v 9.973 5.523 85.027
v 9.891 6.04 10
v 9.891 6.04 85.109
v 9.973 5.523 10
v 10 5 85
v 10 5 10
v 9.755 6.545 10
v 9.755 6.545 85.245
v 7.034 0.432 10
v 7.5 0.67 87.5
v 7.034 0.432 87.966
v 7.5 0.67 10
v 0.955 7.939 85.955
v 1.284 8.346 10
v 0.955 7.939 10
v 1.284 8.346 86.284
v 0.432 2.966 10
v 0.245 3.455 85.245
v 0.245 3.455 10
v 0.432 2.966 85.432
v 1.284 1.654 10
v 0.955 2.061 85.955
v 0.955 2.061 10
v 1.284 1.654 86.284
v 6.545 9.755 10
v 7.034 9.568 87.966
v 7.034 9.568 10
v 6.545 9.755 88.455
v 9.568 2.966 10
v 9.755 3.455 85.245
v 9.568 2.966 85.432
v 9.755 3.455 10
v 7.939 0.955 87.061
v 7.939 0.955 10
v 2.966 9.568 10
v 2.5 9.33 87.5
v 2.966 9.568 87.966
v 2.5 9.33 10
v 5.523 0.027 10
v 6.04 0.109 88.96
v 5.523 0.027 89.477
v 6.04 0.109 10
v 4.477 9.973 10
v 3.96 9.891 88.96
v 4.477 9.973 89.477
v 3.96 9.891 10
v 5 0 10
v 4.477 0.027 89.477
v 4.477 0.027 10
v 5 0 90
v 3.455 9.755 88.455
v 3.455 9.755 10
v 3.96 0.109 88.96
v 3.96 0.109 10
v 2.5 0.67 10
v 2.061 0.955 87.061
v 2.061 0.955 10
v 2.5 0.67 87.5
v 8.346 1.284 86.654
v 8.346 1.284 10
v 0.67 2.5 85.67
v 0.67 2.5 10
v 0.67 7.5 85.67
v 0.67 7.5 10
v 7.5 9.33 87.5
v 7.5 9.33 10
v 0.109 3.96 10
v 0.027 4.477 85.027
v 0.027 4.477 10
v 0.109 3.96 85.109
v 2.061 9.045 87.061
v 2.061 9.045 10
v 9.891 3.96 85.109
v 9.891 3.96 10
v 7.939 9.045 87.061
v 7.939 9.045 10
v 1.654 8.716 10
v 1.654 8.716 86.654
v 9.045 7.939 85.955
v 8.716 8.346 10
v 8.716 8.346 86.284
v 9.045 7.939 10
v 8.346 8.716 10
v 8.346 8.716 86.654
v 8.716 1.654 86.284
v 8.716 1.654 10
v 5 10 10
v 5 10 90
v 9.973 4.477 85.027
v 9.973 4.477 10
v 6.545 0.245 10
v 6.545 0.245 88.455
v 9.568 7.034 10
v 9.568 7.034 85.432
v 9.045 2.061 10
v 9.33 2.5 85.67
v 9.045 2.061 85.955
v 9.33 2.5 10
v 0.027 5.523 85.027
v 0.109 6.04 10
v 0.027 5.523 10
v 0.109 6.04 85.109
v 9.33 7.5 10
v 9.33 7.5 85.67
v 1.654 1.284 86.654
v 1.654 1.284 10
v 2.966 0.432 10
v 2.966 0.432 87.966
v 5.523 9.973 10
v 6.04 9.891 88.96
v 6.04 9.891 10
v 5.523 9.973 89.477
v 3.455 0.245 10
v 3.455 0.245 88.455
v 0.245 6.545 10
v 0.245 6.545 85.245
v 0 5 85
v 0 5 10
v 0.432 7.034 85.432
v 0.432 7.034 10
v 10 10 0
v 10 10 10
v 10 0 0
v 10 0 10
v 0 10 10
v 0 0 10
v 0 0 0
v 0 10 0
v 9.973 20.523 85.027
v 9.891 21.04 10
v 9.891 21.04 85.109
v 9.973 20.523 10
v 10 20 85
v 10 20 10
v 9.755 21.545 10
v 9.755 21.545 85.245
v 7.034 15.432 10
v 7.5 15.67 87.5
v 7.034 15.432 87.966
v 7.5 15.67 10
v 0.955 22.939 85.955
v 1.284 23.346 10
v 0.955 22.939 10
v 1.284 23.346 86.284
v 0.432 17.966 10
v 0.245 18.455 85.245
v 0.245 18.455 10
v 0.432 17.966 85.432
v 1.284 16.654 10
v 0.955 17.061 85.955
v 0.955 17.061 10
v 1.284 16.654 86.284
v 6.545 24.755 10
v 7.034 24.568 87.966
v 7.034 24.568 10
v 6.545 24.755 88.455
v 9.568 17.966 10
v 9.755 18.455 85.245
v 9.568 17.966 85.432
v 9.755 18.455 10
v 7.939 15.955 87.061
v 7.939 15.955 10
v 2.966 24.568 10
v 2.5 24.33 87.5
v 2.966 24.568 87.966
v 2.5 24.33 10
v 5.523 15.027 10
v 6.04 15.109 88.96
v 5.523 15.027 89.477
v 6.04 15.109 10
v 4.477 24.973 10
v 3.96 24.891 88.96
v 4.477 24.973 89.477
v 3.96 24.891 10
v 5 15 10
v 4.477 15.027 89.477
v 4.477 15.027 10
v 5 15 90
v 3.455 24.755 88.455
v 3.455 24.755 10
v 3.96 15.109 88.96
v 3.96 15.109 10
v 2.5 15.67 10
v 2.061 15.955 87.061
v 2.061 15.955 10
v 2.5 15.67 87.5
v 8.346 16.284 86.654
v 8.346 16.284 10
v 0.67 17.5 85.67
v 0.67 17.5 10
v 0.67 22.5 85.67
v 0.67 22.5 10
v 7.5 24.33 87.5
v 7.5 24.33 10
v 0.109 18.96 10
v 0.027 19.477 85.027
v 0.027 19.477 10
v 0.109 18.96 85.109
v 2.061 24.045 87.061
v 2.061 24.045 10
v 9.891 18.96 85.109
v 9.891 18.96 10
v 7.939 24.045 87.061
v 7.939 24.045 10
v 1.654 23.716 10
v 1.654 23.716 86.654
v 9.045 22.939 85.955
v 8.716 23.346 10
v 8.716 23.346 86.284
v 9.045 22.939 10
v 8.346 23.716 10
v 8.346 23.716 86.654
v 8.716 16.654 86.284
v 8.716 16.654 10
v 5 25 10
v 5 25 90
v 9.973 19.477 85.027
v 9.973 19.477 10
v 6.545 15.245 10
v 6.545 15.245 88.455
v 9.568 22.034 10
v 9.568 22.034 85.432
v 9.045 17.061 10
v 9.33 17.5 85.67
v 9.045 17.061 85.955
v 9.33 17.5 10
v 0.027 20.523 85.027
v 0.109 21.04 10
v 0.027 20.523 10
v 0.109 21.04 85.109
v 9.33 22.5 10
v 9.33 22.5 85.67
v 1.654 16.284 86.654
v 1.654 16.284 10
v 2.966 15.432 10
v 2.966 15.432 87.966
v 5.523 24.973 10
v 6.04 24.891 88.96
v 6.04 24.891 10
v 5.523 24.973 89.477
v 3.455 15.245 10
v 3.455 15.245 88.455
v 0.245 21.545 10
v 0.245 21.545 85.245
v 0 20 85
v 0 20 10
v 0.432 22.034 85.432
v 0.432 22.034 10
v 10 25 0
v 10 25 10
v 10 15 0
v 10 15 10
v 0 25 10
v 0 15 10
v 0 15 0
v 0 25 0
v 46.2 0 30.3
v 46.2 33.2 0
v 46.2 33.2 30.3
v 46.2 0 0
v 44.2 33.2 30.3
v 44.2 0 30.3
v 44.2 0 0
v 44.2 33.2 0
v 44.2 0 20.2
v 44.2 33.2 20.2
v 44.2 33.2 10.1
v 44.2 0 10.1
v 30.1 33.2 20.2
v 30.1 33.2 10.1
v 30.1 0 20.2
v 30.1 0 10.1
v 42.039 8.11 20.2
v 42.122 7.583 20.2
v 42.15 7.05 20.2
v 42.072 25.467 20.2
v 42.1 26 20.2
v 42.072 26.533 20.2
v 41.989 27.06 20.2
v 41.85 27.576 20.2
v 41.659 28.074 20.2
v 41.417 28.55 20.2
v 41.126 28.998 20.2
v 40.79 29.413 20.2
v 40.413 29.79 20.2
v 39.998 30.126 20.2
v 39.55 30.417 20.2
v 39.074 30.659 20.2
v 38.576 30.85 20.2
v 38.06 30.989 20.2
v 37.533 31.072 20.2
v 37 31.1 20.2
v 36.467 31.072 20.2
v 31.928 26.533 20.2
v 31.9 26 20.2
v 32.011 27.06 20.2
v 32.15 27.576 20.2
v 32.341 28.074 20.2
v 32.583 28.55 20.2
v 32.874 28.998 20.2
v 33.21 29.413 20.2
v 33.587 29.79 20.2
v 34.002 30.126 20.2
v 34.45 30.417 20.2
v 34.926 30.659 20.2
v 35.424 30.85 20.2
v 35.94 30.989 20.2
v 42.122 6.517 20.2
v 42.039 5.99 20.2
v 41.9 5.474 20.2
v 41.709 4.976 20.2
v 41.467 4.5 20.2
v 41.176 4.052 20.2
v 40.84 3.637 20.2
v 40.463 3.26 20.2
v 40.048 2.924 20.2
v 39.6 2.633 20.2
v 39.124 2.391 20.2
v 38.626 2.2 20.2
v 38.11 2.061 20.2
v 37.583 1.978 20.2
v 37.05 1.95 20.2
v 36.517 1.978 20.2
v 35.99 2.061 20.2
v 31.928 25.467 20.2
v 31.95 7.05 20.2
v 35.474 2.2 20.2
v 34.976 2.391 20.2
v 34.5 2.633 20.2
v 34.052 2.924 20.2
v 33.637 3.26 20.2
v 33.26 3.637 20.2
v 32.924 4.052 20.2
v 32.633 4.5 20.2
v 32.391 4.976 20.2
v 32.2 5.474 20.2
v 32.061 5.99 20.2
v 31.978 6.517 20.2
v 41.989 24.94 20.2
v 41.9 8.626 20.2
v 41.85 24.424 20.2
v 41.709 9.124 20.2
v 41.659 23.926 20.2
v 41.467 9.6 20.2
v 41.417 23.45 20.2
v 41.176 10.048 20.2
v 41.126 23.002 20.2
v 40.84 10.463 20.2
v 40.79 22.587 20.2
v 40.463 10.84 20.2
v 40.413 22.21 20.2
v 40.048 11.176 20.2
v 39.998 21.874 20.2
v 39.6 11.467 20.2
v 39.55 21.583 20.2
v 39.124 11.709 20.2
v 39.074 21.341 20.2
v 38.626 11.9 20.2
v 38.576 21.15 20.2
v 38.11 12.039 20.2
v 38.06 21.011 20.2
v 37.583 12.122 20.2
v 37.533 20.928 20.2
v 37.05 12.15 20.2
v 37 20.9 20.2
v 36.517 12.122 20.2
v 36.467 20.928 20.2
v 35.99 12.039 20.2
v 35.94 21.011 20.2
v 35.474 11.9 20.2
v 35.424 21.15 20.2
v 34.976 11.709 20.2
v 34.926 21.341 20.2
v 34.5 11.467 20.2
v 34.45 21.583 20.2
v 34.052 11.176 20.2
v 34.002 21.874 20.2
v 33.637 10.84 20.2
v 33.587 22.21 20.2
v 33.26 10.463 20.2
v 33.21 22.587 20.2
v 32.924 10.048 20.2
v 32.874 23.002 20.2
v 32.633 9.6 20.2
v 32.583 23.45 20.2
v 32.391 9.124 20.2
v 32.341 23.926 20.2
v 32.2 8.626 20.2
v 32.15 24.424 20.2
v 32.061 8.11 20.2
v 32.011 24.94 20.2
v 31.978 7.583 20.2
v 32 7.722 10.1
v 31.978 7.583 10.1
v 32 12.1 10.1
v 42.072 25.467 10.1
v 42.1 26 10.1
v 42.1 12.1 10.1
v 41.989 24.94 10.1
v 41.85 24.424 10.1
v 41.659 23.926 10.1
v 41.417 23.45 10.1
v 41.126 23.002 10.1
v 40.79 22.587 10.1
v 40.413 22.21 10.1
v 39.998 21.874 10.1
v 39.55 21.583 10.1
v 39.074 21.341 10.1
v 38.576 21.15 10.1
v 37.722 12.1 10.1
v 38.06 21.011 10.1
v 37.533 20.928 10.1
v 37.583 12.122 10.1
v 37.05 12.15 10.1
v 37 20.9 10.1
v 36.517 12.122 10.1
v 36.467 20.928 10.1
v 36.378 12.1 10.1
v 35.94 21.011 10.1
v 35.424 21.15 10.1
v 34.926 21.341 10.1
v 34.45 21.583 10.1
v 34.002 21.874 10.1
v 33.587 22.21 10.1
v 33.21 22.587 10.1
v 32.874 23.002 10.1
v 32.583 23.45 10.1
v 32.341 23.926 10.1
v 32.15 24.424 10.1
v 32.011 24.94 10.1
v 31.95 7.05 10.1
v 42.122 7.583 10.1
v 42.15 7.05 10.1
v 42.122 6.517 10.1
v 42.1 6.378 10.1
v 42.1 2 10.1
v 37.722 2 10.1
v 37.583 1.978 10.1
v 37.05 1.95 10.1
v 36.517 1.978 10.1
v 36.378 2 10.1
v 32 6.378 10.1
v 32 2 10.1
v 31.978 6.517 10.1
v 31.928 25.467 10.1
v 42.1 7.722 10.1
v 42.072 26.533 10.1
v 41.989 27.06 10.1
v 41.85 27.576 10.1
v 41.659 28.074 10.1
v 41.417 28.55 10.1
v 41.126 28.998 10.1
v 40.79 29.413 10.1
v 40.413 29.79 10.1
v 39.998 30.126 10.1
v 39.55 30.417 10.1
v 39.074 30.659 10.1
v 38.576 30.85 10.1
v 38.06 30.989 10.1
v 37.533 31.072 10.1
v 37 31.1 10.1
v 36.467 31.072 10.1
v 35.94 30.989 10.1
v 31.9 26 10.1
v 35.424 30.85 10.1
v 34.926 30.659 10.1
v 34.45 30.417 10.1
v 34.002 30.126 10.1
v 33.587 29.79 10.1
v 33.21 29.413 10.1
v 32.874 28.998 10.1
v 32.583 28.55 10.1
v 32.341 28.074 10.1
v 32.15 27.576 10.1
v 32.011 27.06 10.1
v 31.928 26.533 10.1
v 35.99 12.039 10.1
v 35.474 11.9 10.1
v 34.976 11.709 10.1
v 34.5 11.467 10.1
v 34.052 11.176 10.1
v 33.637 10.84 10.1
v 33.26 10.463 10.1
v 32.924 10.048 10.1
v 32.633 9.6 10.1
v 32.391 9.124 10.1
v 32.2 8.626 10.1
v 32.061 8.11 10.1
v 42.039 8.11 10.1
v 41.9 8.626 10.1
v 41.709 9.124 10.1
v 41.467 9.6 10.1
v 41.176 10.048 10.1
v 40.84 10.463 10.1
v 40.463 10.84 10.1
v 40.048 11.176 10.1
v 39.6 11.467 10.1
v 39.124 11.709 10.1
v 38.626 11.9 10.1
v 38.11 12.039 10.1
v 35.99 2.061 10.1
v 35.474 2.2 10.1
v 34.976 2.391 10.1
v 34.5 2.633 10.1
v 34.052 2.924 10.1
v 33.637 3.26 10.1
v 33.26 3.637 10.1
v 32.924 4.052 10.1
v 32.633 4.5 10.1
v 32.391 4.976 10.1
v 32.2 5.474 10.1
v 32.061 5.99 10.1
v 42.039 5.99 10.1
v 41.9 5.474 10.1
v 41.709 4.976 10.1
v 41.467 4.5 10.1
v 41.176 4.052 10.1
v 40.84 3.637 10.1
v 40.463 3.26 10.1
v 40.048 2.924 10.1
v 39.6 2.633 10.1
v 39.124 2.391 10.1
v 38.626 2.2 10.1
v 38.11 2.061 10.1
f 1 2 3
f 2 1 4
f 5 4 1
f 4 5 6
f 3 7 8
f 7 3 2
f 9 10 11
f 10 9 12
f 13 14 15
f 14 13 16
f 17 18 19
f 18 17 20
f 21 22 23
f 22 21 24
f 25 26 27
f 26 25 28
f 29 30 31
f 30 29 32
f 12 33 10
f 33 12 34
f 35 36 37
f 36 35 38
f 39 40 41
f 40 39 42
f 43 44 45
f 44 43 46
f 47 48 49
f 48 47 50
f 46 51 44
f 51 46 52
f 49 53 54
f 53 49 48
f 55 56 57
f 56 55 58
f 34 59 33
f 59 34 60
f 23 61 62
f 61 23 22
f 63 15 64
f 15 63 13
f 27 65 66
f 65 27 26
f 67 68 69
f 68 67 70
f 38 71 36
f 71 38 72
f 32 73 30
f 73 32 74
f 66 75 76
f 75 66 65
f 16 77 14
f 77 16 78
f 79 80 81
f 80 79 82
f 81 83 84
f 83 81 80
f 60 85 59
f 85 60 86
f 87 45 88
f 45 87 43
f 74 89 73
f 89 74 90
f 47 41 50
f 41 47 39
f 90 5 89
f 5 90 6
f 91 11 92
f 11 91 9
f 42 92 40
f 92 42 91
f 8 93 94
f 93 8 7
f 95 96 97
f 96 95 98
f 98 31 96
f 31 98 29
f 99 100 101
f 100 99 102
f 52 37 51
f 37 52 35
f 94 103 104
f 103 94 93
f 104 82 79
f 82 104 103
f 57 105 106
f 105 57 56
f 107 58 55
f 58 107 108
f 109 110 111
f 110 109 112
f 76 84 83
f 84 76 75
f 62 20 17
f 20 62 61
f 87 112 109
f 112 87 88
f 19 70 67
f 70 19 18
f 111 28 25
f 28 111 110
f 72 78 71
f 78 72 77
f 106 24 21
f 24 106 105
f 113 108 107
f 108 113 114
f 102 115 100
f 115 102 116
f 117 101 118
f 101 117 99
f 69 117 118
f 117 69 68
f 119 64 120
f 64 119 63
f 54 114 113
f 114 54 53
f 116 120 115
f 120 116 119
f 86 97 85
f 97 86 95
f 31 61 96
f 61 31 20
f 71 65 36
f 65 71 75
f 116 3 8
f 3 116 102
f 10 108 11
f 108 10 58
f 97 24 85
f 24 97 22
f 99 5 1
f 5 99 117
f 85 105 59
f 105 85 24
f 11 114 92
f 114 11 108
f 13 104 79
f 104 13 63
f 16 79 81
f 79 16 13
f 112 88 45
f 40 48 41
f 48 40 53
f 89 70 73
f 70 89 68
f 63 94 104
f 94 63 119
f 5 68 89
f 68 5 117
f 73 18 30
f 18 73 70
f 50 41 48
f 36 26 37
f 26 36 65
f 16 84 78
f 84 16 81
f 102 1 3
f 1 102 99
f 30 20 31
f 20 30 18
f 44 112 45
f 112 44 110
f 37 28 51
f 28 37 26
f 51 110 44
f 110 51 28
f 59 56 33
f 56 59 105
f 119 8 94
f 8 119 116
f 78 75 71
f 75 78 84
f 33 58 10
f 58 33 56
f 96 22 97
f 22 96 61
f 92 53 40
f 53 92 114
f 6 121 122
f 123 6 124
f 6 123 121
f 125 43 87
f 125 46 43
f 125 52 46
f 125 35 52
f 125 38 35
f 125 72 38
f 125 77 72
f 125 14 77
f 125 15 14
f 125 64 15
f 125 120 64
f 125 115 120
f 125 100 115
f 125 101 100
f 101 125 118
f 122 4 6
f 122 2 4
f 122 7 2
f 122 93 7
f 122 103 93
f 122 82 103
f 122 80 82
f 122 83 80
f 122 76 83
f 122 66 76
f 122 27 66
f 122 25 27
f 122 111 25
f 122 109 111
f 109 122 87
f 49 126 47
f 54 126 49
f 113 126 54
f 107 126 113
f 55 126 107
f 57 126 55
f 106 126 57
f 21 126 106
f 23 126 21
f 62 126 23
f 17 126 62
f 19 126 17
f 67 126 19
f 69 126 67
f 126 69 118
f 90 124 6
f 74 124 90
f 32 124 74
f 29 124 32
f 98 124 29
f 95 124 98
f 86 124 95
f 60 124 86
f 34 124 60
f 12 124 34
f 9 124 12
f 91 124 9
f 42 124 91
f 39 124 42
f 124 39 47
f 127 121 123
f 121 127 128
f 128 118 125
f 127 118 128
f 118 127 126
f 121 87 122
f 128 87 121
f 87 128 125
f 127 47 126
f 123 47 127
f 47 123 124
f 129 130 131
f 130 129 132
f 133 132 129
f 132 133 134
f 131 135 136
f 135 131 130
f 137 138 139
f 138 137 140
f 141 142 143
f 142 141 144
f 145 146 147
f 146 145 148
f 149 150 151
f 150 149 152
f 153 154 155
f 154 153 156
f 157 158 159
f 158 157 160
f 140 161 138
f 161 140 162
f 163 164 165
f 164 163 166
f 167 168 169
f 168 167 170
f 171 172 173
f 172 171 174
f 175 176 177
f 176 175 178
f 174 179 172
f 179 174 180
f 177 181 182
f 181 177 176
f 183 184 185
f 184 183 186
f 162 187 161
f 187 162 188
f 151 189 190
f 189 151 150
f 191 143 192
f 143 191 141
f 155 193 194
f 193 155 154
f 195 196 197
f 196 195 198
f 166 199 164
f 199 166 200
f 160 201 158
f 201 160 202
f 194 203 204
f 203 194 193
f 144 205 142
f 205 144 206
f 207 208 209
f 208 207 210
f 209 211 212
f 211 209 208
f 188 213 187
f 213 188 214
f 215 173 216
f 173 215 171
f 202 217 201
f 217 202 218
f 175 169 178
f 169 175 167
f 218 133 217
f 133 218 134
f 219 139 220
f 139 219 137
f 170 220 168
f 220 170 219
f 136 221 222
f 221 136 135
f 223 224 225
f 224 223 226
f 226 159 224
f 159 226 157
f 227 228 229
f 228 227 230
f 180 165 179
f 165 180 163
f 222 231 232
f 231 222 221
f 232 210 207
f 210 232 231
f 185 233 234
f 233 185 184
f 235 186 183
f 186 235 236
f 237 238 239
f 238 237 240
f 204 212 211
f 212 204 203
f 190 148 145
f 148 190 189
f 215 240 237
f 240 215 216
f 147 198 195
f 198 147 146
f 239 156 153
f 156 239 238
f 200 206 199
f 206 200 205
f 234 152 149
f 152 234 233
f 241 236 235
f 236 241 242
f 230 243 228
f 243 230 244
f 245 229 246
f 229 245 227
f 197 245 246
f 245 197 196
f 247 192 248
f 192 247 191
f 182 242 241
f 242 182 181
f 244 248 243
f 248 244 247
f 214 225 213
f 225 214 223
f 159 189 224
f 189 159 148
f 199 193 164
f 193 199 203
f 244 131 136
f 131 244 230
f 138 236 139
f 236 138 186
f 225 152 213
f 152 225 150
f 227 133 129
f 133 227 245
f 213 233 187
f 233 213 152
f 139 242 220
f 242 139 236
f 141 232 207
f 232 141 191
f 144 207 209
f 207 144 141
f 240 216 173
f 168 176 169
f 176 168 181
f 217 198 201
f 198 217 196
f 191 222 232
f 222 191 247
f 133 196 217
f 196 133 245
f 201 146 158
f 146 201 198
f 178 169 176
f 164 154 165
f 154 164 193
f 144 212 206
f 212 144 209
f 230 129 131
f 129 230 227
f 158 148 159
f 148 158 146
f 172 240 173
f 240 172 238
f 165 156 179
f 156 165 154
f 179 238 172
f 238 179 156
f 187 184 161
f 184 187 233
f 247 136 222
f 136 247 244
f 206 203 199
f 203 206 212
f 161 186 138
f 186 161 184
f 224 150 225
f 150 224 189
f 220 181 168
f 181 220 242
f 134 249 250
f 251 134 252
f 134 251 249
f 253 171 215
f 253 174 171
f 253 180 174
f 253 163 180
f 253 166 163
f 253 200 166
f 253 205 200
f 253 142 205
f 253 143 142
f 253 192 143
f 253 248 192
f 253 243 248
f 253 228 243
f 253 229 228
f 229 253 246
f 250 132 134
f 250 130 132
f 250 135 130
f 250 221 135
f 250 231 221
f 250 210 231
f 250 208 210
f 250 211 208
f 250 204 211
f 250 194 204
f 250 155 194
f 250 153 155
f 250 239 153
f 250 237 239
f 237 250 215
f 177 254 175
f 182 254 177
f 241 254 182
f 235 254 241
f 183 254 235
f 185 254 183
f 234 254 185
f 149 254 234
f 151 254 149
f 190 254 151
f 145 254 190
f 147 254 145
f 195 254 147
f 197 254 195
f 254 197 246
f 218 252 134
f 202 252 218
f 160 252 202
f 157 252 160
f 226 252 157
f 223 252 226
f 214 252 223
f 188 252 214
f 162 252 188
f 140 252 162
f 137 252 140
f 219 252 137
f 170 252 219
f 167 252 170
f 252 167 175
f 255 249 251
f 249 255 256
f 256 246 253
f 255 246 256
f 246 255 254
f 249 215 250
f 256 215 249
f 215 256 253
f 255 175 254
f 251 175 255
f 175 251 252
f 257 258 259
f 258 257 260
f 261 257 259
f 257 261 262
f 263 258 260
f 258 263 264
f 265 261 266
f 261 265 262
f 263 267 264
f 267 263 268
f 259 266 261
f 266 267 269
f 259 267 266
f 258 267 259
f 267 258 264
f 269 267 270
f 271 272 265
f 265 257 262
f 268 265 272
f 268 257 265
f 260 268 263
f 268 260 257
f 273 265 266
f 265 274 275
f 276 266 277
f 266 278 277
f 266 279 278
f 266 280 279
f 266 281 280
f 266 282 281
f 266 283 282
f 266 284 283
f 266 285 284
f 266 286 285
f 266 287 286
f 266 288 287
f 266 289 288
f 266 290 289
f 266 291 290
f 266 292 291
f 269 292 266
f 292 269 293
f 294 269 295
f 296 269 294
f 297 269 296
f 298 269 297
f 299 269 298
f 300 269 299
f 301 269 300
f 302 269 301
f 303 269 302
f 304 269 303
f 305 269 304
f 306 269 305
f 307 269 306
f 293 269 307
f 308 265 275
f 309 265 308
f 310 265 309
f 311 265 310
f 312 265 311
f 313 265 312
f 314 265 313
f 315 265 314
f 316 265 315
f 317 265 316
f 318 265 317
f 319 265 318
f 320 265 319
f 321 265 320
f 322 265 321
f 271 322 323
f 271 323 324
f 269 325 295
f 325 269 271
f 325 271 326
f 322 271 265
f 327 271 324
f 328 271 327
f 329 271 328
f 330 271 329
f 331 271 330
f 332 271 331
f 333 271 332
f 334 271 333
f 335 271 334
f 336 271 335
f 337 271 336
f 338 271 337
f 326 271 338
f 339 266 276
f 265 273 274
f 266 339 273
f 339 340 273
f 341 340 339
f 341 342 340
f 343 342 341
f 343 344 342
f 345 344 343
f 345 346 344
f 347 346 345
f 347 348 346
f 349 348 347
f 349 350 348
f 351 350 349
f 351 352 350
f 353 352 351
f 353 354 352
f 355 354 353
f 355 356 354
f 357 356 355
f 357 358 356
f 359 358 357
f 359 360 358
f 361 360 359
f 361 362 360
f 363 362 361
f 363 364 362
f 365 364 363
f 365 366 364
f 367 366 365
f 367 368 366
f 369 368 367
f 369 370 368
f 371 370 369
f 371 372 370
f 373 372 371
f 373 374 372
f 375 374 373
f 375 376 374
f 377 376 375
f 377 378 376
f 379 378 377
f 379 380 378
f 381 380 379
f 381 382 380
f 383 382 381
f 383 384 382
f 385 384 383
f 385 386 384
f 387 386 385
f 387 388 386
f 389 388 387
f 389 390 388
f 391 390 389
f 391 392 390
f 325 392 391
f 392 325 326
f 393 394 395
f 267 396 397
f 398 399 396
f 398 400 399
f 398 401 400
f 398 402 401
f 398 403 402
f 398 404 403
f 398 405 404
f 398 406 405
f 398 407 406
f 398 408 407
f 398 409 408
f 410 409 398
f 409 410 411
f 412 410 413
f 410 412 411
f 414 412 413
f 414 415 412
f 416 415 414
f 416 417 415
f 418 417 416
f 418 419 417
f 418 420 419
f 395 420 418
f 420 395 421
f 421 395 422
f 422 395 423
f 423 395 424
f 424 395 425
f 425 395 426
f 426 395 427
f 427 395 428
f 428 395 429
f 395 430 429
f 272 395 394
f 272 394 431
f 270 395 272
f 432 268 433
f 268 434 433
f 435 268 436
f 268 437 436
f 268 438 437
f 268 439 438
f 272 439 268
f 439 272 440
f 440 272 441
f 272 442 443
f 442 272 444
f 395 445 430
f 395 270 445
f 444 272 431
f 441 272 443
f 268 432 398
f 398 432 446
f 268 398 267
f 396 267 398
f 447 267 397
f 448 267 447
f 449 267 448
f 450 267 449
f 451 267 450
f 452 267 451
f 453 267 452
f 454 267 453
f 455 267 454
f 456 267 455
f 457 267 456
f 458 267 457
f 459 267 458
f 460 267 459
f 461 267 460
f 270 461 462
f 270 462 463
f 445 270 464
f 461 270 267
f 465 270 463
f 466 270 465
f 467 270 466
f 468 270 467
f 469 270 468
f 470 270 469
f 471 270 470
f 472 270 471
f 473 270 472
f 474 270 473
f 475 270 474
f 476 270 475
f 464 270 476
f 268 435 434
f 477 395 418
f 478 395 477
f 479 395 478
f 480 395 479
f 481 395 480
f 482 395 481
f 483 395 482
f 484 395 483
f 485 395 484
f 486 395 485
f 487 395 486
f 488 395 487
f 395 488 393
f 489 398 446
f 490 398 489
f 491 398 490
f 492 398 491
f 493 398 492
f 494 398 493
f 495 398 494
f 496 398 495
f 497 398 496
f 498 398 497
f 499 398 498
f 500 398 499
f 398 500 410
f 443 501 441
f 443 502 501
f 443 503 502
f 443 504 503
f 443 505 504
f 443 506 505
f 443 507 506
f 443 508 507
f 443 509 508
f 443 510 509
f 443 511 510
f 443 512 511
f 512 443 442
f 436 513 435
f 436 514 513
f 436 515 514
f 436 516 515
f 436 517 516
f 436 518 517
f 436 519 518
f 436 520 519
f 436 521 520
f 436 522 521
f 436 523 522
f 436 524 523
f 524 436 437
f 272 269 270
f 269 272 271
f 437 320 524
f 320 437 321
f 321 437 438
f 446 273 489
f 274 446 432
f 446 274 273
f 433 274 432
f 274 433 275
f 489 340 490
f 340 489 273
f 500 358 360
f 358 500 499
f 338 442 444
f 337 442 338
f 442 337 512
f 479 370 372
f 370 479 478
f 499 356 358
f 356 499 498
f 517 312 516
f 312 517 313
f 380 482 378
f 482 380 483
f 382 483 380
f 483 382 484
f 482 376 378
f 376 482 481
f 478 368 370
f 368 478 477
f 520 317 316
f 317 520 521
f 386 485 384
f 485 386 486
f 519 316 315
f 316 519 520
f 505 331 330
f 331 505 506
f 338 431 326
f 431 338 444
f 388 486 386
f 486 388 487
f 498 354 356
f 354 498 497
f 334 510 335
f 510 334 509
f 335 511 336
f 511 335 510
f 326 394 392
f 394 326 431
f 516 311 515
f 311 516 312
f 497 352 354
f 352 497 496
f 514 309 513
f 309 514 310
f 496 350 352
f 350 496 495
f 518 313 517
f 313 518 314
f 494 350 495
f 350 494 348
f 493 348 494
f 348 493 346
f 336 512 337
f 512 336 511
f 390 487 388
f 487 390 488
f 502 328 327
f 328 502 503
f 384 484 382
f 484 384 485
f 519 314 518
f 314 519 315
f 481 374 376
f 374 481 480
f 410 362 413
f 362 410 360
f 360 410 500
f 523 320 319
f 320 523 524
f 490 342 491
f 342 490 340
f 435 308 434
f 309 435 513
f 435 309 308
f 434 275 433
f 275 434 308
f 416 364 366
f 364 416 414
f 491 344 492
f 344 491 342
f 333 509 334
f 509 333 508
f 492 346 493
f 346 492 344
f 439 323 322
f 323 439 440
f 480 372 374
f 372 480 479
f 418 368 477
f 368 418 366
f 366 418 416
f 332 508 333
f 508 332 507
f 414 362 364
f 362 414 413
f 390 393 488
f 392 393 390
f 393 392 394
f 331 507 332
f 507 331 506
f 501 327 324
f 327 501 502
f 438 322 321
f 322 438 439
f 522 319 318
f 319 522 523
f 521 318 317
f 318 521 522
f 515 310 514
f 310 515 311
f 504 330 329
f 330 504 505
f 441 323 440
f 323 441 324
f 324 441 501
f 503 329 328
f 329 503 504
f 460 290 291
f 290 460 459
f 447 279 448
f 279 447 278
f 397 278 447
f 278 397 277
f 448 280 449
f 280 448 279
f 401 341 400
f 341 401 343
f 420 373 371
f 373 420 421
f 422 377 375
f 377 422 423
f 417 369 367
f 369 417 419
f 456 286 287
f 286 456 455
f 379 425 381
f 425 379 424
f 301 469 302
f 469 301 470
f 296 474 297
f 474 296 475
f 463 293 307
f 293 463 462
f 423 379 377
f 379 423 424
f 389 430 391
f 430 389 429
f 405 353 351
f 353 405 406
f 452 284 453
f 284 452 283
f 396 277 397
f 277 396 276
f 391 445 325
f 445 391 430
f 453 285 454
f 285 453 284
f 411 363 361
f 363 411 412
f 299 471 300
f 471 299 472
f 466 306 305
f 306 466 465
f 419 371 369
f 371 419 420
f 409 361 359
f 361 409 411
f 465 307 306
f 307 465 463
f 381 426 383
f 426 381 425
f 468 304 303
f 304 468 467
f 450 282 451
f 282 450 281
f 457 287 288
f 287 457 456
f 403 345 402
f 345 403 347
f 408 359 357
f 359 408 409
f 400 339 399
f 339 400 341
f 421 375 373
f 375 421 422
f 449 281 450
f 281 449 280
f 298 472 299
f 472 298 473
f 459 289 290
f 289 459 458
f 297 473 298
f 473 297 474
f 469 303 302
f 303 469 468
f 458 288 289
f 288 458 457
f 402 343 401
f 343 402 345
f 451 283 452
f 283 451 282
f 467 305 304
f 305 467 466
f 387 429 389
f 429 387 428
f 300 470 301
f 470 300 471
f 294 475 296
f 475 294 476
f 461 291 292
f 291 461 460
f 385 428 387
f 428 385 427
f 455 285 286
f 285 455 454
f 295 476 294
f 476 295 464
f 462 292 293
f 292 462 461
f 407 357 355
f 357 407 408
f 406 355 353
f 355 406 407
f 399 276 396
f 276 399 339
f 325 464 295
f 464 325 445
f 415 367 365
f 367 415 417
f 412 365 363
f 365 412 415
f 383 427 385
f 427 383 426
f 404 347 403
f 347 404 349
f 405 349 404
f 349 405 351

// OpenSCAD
// What radius do you want your posts to be (remember diameter is 2x the radius)?
post_radius    = 5;
// How tall do you want your posts to be?
post_height    = 90;
// How wide do you want the base to be? (This must be at least 2 times the radius.  Customizer will auto-adjust if it is not.)
base_width     = 7;
// How thick do you want the holder wall to be?
holder_wall_thickness = 2;

// Do you want two posts?
two_posts   = 1; // [1:Yes, 0:No]
// Make posts flat on one side. (Removes half of the post split down the middle.)
split_posts = 0; // [1:Yes, 0:No]
// Do you want to create the holder?
with_holder = 1; // [1:Yes, 0:No]
// Increase holder hole radius by? [mm]
wiggle_room = 0.1;
// Do you want the top of the posts to be curved?
curved_top  = 1; // [1:Yes, 0:No]

module alignment_post(post_radius = 5, post_height = 70, base_width = 15, curved_top = 1, split_posts = 0, y_offset = 0) {
    extra_offset = curved_top  == 1 ? 0 : post_radius * 10;
    split_cube   = split_posts == 1 ? [base_width / 2 + 0.2, base_width + 0.2, post_height + 0.2] : [0,0,0];

    translate([0, y_offset, 0])
        difference() {
            union() {
                difference() {
                    translate([base_width/2, base_width/2, 0.5])
                        cylinder(
                            h = post_height -0.5,
                            r = post_radius
                        );
                    translate([-post_height/2, base_width/2, post_height + extra_offset])
                    rotate([0,90,0])
                            cylinder(
                                h = post_height,
                                r = post_radius
                            );
                }
                translate([0, 0, 0])
                    cube([base_width, base_width, base_width]);
            }
            translate([base_width/2 - 0.1, -0.1, -0.1])
                cube(split_cube);
        }
}

$fn=60;
actual_base_width           = post_radius * 2 < base_width ? base_width : post_radius * 2;
holder_distance_from_post   = 20;
distance_between_post_bases = 5;
holder_margin               = 2;

module alignment_post_holder(post_radius = 5, post_height = 70, base_width = 15, wall_thickness = 2, two_posts = 1) {
    slot_thickness     = base_width / 2 > 10 ? base_width / 2 : base_width;
    total_height       = base_width * 2 + slot_thickness;
    total_x_margin     = holder_margin * 2;
    total_y_margin     = two_posts == 1 ? holder_margin * 4 : holder_margin * 2;
    total_width        = two_posts == 1 ? base_width * 2 + distance_between_post_bases + total_y_margin : base_width + total_y_margin;

    wall_x = wall_thickness;
    wall_y = total_width;
    wall_z = total_height;

    wall_x_offset = base_width + holder_distance_from_post + base_width + total_x_margin;
    wall_y_offset = 0;
    wall_z_offset = 0;

    slot_x = base_width + total_x_margin;
    slot_y = total_width;
    slot_z = slot_thickness;

    slot_x_offset = base_width + holder_distance_from_post;
    slot_y_offset = 0;
    slot_z_offset = base_width;
    
    union() {
        translate([wall_x_offset, wall_y_offset, wall_z_offset])
            cube([wall_x, wall_y, wall_z]);

        translate([slot_x_offset, slot_y_offset, slot_z_offset])
            cube([slot_x, slot_y, slot_z]);
    }
}

alignment_post(post_radius, post_height, actual_base_width, curved_top, split_posts,  0);

if(two_posts == 1) {
    alignment_post(post_radius, post_height, actual_base_width, curved_top,  split_posts, actual_base_width + distance_between_post_bases);
}

if(with_holder == 1) {
    post_1_x_offset = actual_base_width + holder_distance_from_post + holder_margin;
    post_1_y_offset = holder_margin;
    post_1_z_offset = 0;

    post_2_x_offset = actual_base_width + holder_distance_from_post + holder_margin;
    post_2_y_offset = holder_margin * 2;
    post_2_z_offset = 0;
    
    radius_scale =  (post_radius + wiggle_room) / post_radius;
    

    difference() {
        alignment_post_holder(post_radius * radius_scale, post_height, actual_base_width + wiggle_room, holder_wall_thickness, two_posts);
        {
            translate([post_1_x_offset, post_1_y_offset, post_1_z_offset])
                alignment_post(post_radius * radius_scale, post_height, actual_base_width + wiggle_room, curved_top, split_posts,  0);
            if(two_posts == 1) {
                translate([post_2_x_offset, post_2_y_offset, post_2_z_offset])
                    alignment_post(post_radius * radius_scale, post_height, actual_base_width, curved_top, split_posts, actual_base_width + distance_between_post_bases + holder_margin);
            }
        }
    }
}
